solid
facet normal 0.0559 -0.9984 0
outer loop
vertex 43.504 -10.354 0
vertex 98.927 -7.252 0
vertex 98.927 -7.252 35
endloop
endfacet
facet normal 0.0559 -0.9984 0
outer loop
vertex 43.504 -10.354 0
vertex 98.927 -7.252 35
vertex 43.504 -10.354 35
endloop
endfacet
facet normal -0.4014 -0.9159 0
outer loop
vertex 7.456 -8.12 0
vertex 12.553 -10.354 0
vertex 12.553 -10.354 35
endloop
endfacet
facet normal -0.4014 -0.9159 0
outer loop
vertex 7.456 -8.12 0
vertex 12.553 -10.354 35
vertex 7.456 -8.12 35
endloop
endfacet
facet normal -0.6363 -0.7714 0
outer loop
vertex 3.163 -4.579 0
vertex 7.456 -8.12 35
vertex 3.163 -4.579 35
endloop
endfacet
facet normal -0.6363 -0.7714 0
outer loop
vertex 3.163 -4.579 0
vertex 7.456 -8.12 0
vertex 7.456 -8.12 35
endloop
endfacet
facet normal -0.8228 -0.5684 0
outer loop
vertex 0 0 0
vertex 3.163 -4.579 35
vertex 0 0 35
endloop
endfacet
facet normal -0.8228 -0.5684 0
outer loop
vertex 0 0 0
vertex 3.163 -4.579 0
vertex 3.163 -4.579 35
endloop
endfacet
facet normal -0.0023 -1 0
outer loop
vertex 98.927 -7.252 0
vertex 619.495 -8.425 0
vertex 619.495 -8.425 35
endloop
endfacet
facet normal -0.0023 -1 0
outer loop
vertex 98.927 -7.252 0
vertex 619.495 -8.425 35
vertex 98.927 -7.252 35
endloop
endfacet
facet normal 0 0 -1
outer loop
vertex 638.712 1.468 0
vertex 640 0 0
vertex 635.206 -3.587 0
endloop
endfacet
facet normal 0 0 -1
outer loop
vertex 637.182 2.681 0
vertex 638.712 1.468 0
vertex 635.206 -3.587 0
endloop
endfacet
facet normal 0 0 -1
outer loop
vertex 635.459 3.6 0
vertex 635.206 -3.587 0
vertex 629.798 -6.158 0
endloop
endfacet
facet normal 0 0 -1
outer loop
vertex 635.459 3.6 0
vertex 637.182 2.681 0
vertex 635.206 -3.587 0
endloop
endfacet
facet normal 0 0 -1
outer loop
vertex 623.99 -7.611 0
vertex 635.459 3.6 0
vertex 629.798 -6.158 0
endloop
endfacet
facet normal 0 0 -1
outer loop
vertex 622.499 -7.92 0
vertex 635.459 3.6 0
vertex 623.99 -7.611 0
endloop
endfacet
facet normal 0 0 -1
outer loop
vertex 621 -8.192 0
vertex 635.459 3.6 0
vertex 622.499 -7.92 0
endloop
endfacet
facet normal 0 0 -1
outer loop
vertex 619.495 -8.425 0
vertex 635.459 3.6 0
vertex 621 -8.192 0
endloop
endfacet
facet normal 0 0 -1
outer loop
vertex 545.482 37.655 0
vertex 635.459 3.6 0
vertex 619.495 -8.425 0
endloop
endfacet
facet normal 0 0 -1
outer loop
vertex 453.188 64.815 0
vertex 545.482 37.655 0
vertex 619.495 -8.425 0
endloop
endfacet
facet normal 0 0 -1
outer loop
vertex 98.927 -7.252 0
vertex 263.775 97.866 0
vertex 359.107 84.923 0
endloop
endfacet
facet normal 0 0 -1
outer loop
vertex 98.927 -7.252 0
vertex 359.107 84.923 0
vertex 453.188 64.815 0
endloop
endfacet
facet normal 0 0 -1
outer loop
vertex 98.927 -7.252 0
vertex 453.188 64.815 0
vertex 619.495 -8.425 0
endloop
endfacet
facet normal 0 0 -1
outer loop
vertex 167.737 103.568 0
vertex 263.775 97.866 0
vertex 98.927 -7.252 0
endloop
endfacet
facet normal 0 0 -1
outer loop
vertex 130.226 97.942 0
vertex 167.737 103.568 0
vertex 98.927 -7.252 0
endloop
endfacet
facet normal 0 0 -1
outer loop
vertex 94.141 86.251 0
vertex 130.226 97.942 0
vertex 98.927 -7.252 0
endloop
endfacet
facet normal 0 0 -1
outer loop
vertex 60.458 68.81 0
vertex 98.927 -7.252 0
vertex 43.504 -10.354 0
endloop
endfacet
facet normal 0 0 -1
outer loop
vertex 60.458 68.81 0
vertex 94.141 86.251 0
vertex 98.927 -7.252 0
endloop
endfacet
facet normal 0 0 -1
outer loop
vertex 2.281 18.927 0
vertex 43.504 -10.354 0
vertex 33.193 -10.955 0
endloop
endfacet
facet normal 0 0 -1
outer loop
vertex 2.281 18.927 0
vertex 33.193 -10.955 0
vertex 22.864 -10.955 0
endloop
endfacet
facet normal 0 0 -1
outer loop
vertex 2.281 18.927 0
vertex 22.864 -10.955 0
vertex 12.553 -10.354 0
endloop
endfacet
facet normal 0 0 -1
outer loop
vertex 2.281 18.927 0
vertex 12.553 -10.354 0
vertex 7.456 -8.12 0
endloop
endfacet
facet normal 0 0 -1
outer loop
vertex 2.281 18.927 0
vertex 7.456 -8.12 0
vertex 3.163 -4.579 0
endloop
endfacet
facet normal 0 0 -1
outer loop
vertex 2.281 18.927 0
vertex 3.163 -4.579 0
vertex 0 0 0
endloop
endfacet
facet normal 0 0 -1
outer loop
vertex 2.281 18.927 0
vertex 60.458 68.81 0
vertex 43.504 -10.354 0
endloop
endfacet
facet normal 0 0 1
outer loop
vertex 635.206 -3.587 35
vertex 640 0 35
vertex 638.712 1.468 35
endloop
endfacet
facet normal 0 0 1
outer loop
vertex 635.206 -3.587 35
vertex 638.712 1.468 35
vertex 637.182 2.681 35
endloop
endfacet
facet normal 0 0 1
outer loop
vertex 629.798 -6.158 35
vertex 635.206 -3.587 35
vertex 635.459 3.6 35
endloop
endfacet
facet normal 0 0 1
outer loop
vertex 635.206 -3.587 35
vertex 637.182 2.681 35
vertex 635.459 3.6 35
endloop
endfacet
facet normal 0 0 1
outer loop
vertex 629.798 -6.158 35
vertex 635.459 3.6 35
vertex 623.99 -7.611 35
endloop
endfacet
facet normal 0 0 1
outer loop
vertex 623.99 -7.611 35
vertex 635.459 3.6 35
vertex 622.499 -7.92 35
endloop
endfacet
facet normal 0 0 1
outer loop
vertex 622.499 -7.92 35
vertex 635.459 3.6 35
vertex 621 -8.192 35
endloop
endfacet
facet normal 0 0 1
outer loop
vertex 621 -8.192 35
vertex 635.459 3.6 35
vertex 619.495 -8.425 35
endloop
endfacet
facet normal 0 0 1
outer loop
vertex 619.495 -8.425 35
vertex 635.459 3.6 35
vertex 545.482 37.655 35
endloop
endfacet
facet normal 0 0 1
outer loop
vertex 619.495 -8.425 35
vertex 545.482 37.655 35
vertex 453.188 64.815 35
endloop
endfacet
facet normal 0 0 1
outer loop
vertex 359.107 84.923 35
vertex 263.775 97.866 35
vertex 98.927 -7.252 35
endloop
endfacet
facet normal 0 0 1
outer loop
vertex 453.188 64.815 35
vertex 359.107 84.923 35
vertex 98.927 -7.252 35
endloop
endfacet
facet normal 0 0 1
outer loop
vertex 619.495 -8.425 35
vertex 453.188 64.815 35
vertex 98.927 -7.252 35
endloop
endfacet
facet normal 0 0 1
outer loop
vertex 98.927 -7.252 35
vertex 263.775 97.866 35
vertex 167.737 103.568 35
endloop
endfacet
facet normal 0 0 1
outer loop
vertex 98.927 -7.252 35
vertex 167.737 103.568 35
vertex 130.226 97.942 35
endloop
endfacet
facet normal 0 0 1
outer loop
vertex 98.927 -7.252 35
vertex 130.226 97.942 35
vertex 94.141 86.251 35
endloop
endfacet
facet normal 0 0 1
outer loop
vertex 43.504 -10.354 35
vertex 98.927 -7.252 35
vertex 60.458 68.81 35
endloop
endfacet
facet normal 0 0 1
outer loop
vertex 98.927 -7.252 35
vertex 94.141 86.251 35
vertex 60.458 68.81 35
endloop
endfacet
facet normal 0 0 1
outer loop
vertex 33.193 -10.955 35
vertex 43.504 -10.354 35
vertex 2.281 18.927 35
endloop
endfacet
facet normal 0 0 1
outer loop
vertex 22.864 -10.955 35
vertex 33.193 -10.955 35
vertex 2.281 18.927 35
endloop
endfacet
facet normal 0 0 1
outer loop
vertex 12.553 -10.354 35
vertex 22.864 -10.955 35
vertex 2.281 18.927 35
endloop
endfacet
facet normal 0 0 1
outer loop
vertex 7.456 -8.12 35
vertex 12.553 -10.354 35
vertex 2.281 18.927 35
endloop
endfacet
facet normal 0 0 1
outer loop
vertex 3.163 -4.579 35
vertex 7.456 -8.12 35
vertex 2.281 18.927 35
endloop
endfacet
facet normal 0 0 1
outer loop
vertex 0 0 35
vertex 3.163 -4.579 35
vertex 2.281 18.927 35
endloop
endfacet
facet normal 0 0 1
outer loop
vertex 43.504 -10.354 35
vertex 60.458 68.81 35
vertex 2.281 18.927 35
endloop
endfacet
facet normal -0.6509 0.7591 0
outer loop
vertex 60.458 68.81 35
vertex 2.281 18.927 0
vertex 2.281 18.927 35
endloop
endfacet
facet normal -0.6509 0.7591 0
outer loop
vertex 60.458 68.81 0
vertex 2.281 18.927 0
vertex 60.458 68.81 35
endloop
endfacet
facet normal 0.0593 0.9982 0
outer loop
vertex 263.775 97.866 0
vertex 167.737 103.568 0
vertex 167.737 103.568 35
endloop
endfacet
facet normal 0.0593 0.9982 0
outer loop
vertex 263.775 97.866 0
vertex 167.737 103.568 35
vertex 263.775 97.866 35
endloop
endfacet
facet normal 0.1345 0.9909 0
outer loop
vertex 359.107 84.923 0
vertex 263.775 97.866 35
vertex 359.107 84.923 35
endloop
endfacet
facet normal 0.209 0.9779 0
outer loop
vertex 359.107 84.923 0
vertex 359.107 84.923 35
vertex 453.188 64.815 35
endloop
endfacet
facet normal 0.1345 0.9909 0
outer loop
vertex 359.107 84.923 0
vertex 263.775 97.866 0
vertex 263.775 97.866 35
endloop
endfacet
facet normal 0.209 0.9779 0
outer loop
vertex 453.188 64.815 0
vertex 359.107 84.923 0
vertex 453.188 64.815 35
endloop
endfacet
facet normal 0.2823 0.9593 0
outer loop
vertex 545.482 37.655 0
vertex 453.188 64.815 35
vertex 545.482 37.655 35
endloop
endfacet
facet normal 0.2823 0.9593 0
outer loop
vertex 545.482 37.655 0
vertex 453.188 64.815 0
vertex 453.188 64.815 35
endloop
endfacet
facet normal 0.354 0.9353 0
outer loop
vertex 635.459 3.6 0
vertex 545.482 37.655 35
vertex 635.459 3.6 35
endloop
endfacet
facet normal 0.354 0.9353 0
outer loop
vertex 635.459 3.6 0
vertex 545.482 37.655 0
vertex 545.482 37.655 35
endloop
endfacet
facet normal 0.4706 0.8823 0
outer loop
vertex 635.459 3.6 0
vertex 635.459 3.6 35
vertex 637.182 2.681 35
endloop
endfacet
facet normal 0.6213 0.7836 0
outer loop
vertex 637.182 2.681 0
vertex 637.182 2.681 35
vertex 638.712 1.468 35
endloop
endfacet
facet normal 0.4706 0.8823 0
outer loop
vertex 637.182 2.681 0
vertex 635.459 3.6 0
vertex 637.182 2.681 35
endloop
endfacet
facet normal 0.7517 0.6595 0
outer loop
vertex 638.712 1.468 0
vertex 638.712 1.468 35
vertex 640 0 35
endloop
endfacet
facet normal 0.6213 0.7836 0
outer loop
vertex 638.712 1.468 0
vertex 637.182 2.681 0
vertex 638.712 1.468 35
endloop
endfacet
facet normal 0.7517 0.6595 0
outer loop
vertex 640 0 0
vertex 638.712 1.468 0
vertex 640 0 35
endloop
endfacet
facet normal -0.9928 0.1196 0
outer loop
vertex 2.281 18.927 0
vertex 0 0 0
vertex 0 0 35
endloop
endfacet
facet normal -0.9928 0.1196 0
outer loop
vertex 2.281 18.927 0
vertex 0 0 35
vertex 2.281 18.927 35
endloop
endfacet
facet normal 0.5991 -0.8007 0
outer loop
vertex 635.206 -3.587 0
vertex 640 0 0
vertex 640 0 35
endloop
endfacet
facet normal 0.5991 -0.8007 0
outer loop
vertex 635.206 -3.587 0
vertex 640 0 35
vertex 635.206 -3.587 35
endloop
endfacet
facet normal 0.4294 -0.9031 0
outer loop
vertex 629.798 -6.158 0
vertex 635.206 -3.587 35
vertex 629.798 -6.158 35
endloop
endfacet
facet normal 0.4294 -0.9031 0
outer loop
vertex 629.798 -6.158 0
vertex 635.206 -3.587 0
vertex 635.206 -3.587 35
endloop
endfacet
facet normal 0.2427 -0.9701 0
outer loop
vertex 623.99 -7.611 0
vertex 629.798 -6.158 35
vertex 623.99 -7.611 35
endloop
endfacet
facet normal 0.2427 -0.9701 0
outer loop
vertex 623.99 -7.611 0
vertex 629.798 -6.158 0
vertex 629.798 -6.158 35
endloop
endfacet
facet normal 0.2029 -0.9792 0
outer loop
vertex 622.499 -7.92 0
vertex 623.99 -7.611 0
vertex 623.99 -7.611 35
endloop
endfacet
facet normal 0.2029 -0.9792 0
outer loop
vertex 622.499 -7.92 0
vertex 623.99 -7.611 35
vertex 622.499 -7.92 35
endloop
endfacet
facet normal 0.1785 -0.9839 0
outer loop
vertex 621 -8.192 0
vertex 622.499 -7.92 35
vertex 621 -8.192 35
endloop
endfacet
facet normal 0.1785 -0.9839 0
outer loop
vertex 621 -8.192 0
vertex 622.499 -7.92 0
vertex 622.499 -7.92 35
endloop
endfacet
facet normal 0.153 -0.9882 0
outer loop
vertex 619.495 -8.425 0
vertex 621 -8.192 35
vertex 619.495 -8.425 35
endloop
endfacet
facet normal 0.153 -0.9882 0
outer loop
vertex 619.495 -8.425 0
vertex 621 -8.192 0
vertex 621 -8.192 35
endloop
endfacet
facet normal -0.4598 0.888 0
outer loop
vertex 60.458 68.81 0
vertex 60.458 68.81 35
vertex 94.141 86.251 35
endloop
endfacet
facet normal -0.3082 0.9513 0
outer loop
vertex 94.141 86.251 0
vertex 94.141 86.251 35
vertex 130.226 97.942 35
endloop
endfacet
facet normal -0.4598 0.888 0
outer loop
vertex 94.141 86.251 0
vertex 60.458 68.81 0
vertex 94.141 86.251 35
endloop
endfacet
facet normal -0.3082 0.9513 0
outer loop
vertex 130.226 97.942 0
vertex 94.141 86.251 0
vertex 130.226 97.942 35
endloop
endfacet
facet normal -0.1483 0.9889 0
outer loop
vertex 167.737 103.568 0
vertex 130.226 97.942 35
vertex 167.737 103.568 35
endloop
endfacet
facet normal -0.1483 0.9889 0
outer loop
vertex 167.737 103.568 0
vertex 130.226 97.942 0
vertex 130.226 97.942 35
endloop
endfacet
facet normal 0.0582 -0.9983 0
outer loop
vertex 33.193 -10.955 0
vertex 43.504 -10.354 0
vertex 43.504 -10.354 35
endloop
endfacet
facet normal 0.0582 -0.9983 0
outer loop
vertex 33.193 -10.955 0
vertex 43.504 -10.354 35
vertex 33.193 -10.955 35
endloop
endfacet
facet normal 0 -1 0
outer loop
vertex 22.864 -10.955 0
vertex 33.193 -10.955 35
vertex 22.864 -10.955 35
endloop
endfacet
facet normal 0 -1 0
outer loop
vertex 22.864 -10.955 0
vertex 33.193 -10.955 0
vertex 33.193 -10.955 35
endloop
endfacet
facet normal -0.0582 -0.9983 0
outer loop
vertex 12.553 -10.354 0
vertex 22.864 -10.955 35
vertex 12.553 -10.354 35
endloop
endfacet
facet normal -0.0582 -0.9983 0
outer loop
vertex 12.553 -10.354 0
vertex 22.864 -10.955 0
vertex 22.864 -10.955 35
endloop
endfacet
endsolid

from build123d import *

# Parameters (mm, degrees)
TABAN_FLAN_1_DEPTH = 35


# Sheet-metal steps are written as plain solids
with BuildPart() as part:
    # Çizim1 → Taban-Flanş1 (new body)
    with BuildSketch(Plane.XY):
        with BuildLine():
            Line((619.494818874, -8.424828485), (98.926807278, -7.251557341))
            Line((98.926807278, -7.251557341), (43.504425744, -10.354452253))
            ThreePointArc((43.504425744, -10.354452253), (28.028820782, -11.029931963), (12.553215819, -10.354452253))
            ThreePointArc((12.553215819, -10.354452253), (5.187207724, -6.497959982), (0, 0))
            Line((0, 0), (2.280792838, 18.926510932))
            Line((2.280792838, 18.926510932), (60.45793545, 68.809534856))
            ThreePointArc((60.45793545, 68.809534856), (111.943036833, 92.83857175), (167.737234585, 103.567866957))
            ThreePointArc((167.737234585, 103.567866957), (406.337705204, 75.758628342), (635.459190458, 3.599891337))
            ThreePointArc((635.459190458, 3.599891337), (637.974703815, 2.109119279), (640, 0))
            ThreePointArc((640, 0), (632.566042161, -5.006768243), (623.989844607, -7.610667804))
            ThreePointArc((623.989844607, -7.610667804), (621.750134496, -8.060827589), (619.494818874, -8.424828485))
        make_face()
    extrude(amount=TABAN_FLAN_1_DEPTH)


solid = part.part
